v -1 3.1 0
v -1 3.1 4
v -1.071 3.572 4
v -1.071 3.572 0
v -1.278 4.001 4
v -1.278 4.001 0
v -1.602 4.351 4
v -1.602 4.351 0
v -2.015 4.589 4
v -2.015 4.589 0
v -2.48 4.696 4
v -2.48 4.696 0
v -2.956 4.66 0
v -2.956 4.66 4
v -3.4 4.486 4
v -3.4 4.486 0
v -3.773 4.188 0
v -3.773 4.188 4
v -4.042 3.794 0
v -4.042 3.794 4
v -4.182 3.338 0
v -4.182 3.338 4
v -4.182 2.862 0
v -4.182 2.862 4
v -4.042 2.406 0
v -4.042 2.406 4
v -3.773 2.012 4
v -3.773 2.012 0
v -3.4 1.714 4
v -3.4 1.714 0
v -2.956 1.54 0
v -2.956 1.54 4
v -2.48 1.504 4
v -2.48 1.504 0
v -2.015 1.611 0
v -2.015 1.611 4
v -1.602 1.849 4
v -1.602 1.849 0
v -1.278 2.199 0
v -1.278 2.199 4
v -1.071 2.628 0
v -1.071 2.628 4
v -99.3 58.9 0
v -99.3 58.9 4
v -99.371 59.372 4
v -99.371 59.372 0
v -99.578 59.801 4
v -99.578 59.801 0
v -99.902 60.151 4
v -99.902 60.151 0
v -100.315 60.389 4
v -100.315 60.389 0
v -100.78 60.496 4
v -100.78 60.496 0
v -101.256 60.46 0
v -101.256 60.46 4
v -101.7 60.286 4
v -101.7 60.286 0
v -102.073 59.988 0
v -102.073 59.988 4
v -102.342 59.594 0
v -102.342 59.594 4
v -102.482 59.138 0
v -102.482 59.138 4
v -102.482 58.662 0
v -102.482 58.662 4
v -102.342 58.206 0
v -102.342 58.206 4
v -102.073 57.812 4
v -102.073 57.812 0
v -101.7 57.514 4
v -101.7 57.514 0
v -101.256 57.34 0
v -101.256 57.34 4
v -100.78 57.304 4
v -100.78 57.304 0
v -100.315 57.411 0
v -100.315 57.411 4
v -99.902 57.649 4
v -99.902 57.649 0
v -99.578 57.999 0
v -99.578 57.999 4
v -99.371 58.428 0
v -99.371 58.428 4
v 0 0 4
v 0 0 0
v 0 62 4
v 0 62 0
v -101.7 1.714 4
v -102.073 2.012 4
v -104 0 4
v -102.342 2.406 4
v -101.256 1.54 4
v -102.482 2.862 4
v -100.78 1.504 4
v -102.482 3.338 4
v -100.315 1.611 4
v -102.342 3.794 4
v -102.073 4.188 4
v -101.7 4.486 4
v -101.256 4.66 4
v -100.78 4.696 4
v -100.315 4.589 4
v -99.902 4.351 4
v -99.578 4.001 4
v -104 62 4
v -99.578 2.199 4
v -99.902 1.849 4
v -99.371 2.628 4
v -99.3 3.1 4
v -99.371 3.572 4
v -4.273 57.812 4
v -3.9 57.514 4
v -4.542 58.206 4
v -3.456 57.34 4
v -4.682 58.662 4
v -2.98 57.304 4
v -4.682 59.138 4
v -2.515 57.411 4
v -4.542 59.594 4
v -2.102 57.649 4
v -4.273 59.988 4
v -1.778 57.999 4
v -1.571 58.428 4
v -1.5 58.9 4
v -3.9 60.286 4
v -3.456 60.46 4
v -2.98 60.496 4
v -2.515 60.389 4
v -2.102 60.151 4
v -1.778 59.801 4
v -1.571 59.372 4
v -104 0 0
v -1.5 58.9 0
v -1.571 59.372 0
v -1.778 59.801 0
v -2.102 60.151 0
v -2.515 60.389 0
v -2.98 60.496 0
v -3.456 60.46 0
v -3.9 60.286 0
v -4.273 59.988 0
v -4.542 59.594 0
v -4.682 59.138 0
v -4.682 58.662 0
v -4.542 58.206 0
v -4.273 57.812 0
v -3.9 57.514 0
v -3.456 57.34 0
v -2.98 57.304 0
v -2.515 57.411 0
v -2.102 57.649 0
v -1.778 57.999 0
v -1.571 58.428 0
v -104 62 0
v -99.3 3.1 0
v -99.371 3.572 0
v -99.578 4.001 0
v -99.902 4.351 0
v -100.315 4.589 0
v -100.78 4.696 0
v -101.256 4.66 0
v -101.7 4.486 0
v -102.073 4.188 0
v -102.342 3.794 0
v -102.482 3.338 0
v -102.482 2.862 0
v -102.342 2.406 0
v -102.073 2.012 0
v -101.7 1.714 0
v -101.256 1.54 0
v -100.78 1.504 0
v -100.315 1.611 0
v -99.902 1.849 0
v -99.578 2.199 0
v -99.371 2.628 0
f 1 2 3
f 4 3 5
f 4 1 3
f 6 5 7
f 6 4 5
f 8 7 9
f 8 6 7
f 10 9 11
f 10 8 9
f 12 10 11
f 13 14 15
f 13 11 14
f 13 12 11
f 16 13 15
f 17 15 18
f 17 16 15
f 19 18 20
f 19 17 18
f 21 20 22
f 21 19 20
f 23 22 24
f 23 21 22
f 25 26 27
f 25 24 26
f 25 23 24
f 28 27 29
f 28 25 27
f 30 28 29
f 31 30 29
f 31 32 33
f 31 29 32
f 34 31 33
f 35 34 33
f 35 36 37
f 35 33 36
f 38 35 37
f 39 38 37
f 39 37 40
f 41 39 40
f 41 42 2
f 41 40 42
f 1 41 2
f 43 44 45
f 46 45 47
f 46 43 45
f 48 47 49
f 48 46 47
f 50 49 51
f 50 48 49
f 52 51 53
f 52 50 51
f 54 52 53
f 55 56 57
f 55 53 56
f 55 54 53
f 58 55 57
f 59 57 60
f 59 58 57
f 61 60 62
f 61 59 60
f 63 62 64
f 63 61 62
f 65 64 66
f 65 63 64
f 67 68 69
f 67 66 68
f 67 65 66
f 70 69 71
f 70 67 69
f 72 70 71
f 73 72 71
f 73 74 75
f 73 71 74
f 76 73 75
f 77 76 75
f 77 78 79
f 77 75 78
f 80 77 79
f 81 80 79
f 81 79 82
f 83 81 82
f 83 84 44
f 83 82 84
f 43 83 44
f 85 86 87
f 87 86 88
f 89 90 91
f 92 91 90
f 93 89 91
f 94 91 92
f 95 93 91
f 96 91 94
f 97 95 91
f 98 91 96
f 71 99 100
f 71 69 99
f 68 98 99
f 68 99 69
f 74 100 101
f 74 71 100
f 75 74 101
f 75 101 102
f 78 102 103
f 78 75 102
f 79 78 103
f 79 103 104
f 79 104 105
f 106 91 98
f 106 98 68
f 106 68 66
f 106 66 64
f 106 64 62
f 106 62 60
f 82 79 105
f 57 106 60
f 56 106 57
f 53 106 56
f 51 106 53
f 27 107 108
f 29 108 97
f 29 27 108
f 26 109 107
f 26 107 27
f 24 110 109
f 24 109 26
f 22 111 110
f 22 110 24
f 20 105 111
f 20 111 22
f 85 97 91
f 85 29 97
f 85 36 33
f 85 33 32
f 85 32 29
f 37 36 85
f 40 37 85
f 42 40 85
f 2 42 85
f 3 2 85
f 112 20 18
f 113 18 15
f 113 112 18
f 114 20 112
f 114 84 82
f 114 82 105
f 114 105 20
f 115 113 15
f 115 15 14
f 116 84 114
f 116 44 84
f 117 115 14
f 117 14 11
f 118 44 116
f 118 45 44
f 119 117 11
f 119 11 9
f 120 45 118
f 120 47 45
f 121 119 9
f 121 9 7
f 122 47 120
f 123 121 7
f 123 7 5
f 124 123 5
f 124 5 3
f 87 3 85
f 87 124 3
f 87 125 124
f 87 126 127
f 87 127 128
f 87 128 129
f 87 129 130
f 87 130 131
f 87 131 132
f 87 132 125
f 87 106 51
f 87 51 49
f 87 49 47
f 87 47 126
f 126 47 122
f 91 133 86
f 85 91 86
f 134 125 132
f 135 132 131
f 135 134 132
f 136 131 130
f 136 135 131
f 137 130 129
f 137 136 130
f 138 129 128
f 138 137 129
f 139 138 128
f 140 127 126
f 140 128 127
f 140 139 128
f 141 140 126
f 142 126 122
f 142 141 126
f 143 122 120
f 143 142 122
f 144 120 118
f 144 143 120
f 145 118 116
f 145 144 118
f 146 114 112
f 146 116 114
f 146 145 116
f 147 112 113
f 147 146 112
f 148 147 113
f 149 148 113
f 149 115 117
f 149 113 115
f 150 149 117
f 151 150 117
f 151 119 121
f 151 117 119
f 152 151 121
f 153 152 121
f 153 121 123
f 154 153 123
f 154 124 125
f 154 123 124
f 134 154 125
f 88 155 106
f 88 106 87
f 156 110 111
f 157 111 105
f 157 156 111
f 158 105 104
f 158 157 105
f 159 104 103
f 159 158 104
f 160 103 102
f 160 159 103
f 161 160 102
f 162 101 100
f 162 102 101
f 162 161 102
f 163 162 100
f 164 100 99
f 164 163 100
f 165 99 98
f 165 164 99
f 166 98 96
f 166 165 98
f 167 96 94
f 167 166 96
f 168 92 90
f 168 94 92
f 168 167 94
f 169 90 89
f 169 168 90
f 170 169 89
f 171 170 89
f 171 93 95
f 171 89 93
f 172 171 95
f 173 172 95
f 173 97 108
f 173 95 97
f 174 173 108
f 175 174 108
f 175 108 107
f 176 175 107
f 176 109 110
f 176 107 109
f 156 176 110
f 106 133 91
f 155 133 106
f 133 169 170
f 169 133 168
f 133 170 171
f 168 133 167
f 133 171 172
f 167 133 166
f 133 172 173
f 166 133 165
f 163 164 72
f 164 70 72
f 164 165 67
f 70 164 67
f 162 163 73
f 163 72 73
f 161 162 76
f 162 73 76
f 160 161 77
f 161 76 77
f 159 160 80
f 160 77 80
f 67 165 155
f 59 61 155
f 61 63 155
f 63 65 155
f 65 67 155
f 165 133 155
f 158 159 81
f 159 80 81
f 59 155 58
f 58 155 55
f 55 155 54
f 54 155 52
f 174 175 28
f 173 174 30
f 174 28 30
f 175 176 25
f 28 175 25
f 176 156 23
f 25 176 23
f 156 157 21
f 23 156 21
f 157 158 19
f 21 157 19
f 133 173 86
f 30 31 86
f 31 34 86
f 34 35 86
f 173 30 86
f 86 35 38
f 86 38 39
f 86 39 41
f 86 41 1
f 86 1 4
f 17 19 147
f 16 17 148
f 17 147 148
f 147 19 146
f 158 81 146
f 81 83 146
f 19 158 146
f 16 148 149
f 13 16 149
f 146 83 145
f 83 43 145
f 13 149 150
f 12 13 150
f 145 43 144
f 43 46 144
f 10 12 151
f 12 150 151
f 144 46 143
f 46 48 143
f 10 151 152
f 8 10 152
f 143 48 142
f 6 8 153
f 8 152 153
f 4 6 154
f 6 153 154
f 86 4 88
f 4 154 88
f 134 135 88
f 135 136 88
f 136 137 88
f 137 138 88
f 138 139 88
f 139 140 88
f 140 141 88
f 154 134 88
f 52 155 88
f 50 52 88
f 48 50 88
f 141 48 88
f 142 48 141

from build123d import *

# Parameters (mm, degrees)
CYLINDER007_R     = 1.6
CYLINDER007_DEPTH = 10
CYLINDER006_R     = 1.6
CYLINDER006_DEPTH = 10
CYLINDER005_R     = 1.6
CYLINDER005_DEPTH = 10
CYLINDER004_R     = 1.6
CYLINDER004_DEPTH = 10
BOX001_W          = 104
BOX001_H          = 62
BOX001_DEPTH      = 4


with BuildPart() as mount_point003:
    # Cylinder007 → Cylinder007 (new body)
    with BuildSketch(Plane(origin=(-3.1, 58.9, 0), x_dir=(1, 0, 0), z_dir=(0, 0, 1))):
        Circle(CYLINDER007_R)
    extrude(amount=CYLINDER007_DEPTH)


with BuildPart() as mount_point002:
    # Cylinder006 → Cylinder006 (new body)
    with BuildSketch(Plane(origin=(-100.9, 58.9, 0), x_dir=(1, 0, 0), z_dir=(0, 0, 1))):
        Circle(CYLINDER006_R)
    extrude(amount=CYLINDER006_DEPTH)


with BuildPart() as mount_point001:
    # Cylinder005 → Cylinder005 (new body)
    with BuildSketch(Plane(origin=(-100.9, 3.1, 0), x_dir=(1, 0, 0), z_dir=(0, 0, 1))):
        Circle(CYLINDER005_R)
    extrude(amount=CYLINDER005_DEPTH)


with BuildPart() as mount_point:
    # Cylinder004 → Cylinder004 (new body)
    with BuildSketch(Plane(origin=(-2.6, 3.1, 0), x_dir=(1, 0, 0), z_dir=(0, 0, 1))):
        Circle(CYLINDER004_R)
    extrude(amount=CYLINDER004_DEPTH)


with BuildPart() as standard_platform:
    # Box001 → Box001 (new body)
    with BuildSketch(Plane(origin=(-104, 0, 0), x_dir=(1, 0, 0), z_dir=(0, 0, 1))):
        with Locations((52, 31)):
            Rectangle(BOX001_W, BOX001_H)
    extrude(amount=BOX001_DEPTH)

    # Cut005: cut Mount Point
    add(mount_point.part, mode=Mode.SUBTRACT)

    # Cut006: cut Mount Point001
    add(mount_point001.part, mode=Mode.SUBTRACT)

    # Cut007: cut Mount Point002
    add(mount_point002.part, mode=Mode.SUBTRACT)

    # Cut008: cut Mount Point003
    add(mount_point003.part, mode=Mode.SUBTRACT)


solid = standard_platform.part
